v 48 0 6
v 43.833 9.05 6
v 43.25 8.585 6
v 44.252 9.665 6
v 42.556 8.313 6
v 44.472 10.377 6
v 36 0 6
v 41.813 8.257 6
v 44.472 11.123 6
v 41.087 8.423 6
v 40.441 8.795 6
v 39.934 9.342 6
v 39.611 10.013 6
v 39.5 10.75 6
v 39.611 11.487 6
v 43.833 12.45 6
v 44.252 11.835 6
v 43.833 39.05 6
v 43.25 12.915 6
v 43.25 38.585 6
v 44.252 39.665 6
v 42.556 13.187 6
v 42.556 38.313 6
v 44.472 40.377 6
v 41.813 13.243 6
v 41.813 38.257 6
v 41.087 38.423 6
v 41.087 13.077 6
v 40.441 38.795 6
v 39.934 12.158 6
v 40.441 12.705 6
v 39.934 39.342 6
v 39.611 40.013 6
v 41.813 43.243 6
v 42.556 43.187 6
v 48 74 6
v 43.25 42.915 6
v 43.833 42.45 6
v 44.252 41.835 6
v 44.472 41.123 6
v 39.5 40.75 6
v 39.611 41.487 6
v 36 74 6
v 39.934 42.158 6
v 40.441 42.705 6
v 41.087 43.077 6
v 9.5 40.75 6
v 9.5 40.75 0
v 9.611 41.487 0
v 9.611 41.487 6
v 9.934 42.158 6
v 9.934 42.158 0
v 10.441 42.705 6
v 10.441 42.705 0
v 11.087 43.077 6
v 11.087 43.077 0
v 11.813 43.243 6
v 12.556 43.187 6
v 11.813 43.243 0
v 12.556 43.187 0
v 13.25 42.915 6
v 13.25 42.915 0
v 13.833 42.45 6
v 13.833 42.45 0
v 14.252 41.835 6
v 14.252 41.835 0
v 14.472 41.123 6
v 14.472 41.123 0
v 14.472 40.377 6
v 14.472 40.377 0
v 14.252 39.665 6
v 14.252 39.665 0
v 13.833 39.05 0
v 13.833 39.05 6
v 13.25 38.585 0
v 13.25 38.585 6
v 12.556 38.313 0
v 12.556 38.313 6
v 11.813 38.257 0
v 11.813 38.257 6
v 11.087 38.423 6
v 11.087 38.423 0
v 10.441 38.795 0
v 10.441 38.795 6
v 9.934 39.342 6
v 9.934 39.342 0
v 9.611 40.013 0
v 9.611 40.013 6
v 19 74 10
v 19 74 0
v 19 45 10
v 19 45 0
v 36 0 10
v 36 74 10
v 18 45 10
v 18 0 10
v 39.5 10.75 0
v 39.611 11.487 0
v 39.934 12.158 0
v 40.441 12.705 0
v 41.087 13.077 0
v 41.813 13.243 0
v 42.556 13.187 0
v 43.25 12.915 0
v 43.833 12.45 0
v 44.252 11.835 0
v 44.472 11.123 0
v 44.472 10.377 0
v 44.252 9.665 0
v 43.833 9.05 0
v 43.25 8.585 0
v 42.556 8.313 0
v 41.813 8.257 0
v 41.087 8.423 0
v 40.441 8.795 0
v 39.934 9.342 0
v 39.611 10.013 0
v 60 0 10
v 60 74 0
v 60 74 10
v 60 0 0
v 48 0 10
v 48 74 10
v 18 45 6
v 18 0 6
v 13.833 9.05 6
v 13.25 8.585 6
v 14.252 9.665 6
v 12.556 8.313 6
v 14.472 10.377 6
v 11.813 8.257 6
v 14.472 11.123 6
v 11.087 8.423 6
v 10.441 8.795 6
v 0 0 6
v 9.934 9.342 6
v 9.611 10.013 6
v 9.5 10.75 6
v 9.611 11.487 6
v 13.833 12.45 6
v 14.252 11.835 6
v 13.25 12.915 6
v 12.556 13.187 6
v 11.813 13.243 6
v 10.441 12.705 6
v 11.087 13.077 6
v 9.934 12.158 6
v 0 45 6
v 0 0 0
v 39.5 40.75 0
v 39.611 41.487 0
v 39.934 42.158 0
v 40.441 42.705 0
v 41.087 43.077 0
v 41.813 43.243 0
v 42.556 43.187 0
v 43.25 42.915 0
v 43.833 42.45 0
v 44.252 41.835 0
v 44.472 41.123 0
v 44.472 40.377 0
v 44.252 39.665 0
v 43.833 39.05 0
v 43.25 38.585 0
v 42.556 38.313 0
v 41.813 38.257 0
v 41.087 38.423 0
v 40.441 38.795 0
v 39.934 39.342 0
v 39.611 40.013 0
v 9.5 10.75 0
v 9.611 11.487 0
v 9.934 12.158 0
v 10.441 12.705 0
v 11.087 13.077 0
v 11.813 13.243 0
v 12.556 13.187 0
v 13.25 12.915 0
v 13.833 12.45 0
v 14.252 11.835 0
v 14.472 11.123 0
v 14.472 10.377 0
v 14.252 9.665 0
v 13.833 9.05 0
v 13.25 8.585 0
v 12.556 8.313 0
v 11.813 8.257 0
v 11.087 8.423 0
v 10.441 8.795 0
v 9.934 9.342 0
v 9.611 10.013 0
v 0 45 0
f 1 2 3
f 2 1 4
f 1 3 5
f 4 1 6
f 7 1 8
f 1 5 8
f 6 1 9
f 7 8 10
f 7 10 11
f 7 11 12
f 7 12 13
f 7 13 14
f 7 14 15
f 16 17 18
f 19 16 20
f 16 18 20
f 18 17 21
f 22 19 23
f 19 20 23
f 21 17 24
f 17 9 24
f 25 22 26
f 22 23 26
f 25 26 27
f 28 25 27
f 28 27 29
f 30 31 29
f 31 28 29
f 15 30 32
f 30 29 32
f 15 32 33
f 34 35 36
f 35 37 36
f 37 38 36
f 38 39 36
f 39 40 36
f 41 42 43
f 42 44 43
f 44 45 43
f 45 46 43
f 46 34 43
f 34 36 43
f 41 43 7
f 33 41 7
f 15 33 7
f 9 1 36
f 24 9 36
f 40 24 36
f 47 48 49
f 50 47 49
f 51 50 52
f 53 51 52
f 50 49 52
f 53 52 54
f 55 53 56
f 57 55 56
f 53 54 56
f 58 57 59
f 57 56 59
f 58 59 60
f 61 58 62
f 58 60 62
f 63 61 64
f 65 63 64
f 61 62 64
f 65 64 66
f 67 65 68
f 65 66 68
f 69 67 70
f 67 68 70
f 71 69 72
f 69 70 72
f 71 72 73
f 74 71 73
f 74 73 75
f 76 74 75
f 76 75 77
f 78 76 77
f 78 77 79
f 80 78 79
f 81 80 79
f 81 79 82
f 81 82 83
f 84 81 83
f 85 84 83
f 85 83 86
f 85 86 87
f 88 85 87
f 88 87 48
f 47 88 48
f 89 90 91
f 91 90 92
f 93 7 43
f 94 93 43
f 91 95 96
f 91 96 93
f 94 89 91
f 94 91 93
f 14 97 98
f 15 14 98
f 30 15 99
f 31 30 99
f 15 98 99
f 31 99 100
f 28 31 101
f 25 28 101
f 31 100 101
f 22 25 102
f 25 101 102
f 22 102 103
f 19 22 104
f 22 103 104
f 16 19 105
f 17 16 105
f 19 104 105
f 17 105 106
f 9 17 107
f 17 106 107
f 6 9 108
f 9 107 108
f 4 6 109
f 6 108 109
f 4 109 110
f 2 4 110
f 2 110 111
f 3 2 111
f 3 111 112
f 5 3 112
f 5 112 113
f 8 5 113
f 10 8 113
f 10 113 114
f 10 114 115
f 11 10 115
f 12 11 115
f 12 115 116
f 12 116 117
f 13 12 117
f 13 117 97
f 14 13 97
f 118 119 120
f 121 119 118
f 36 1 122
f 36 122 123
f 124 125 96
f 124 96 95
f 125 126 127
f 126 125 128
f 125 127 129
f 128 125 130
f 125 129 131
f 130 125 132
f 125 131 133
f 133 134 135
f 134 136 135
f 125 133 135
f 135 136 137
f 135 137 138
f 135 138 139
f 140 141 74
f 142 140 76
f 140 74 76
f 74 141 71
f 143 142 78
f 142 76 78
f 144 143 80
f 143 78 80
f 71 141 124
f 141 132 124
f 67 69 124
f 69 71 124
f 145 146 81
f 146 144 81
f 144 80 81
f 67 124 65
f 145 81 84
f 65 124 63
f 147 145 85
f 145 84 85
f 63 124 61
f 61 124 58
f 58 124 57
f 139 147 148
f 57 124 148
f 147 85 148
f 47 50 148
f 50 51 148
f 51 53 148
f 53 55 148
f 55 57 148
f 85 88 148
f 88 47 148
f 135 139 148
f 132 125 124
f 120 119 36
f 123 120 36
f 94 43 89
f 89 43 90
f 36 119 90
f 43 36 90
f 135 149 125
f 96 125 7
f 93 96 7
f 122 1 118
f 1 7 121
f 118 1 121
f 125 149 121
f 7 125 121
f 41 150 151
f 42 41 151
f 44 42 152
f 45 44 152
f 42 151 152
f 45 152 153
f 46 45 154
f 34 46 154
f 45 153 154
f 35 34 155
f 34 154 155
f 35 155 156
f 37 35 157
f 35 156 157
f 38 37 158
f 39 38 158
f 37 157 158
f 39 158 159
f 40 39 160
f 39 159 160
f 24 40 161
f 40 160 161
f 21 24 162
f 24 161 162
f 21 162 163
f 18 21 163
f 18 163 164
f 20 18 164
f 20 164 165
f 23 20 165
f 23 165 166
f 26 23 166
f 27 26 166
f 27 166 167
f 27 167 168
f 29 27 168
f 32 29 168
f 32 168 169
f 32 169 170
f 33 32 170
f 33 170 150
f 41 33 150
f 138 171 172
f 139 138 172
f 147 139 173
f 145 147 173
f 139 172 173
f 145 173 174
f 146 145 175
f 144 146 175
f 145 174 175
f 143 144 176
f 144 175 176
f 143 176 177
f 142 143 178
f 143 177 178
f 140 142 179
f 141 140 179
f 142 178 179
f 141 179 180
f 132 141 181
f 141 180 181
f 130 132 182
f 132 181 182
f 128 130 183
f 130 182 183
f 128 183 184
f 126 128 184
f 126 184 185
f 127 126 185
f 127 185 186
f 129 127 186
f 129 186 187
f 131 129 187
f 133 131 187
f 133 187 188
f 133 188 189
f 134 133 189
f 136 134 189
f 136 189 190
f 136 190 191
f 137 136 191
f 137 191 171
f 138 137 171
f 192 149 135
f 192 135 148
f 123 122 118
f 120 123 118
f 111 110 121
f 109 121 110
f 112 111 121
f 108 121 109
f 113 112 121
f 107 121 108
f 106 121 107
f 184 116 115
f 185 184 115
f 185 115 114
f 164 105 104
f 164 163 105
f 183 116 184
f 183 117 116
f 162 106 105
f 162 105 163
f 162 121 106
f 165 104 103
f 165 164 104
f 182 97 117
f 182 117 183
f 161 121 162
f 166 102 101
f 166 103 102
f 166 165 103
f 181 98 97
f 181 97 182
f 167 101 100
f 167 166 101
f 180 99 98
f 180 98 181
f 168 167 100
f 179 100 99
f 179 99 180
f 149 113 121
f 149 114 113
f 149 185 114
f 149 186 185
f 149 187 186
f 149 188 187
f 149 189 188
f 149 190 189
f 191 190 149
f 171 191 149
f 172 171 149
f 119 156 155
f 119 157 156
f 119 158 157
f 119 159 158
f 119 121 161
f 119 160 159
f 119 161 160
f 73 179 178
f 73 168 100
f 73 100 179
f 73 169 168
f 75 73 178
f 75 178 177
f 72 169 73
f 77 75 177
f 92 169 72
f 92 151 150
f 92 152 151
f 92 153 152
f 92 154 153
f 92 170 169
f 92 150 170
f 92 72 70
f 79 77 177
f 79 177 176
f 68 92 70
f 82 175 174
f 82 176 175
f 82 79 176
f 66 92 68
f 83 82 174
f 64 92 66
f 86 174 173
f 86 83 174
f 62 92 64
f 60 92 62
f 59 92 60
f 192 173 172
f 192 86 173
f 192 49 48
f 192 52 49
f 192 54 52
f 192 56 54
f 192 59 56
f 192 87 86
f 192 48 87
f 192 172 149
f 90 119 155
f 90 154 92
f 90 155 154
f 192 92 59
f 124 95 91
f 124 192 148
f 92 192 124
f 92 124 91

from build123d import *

# Parameters (mm, degrees)
BOSS_EXTRUDE1_DEPTH      = 6
SKETCH2_W                = 12
SKETCH2_H                = 74
SKETCH2_W_2              = 1
SKETCH2_H_2              = 45
BOSS_EXTRUDE2_DEPTH      = 4
F_5_0_5_DIAMETER_HOLE1_D = 5
F_5_0_5_DIAMETER_HOLE2_D = 5


with BuildPart() as part:
    # Sketch1 → Boss-Extrude1 (new body)
    with BuildSketch(Plane.XY):
        Polygon((0, 0), (0, 45), (19, 45), (19, 74), (60, 74), (60, 0), align=None)
    extrude(amount=BOSS_EXTRUDE1_DEPTH)

    # Sketch2 → Boss-Extrude2 (add)
    with BuildSketch(Plane.XY.offset(6)):
        Polygon((36, 0), (36, 74), (19, 74), (19, 45), (19, 0), align=None)
        with Locations((54, 37)):
            Rectangle(SKETCH2_W, SKETCH2_H)
        with Locations((18.5, 22.5)):
            Rectangle(SKETCH2_W_2, SKETCH2_H_2)
    extrude(amount=BOSS_EXTRUDE2_DEPTH)

    # Ø5.0 (5) Diameter Hole1 (through all)
    with Locations(Plane.XY.offset(6)):
        with Locations((42, 40.75), (42, 10.75)):
            Hole(F_5_0_5_DIAMETER_HOLE1_D / 2)

    # Ø5.0 (5) Diameter Hole2 (through all)
    with Locations(Plane.XY.offset(6)):
        with Locations((12, 10.75), (12, 40.75)):
            Hole(F_5_0_5_DIAMETER_HOLE2_D / 2)


solid = part.part
